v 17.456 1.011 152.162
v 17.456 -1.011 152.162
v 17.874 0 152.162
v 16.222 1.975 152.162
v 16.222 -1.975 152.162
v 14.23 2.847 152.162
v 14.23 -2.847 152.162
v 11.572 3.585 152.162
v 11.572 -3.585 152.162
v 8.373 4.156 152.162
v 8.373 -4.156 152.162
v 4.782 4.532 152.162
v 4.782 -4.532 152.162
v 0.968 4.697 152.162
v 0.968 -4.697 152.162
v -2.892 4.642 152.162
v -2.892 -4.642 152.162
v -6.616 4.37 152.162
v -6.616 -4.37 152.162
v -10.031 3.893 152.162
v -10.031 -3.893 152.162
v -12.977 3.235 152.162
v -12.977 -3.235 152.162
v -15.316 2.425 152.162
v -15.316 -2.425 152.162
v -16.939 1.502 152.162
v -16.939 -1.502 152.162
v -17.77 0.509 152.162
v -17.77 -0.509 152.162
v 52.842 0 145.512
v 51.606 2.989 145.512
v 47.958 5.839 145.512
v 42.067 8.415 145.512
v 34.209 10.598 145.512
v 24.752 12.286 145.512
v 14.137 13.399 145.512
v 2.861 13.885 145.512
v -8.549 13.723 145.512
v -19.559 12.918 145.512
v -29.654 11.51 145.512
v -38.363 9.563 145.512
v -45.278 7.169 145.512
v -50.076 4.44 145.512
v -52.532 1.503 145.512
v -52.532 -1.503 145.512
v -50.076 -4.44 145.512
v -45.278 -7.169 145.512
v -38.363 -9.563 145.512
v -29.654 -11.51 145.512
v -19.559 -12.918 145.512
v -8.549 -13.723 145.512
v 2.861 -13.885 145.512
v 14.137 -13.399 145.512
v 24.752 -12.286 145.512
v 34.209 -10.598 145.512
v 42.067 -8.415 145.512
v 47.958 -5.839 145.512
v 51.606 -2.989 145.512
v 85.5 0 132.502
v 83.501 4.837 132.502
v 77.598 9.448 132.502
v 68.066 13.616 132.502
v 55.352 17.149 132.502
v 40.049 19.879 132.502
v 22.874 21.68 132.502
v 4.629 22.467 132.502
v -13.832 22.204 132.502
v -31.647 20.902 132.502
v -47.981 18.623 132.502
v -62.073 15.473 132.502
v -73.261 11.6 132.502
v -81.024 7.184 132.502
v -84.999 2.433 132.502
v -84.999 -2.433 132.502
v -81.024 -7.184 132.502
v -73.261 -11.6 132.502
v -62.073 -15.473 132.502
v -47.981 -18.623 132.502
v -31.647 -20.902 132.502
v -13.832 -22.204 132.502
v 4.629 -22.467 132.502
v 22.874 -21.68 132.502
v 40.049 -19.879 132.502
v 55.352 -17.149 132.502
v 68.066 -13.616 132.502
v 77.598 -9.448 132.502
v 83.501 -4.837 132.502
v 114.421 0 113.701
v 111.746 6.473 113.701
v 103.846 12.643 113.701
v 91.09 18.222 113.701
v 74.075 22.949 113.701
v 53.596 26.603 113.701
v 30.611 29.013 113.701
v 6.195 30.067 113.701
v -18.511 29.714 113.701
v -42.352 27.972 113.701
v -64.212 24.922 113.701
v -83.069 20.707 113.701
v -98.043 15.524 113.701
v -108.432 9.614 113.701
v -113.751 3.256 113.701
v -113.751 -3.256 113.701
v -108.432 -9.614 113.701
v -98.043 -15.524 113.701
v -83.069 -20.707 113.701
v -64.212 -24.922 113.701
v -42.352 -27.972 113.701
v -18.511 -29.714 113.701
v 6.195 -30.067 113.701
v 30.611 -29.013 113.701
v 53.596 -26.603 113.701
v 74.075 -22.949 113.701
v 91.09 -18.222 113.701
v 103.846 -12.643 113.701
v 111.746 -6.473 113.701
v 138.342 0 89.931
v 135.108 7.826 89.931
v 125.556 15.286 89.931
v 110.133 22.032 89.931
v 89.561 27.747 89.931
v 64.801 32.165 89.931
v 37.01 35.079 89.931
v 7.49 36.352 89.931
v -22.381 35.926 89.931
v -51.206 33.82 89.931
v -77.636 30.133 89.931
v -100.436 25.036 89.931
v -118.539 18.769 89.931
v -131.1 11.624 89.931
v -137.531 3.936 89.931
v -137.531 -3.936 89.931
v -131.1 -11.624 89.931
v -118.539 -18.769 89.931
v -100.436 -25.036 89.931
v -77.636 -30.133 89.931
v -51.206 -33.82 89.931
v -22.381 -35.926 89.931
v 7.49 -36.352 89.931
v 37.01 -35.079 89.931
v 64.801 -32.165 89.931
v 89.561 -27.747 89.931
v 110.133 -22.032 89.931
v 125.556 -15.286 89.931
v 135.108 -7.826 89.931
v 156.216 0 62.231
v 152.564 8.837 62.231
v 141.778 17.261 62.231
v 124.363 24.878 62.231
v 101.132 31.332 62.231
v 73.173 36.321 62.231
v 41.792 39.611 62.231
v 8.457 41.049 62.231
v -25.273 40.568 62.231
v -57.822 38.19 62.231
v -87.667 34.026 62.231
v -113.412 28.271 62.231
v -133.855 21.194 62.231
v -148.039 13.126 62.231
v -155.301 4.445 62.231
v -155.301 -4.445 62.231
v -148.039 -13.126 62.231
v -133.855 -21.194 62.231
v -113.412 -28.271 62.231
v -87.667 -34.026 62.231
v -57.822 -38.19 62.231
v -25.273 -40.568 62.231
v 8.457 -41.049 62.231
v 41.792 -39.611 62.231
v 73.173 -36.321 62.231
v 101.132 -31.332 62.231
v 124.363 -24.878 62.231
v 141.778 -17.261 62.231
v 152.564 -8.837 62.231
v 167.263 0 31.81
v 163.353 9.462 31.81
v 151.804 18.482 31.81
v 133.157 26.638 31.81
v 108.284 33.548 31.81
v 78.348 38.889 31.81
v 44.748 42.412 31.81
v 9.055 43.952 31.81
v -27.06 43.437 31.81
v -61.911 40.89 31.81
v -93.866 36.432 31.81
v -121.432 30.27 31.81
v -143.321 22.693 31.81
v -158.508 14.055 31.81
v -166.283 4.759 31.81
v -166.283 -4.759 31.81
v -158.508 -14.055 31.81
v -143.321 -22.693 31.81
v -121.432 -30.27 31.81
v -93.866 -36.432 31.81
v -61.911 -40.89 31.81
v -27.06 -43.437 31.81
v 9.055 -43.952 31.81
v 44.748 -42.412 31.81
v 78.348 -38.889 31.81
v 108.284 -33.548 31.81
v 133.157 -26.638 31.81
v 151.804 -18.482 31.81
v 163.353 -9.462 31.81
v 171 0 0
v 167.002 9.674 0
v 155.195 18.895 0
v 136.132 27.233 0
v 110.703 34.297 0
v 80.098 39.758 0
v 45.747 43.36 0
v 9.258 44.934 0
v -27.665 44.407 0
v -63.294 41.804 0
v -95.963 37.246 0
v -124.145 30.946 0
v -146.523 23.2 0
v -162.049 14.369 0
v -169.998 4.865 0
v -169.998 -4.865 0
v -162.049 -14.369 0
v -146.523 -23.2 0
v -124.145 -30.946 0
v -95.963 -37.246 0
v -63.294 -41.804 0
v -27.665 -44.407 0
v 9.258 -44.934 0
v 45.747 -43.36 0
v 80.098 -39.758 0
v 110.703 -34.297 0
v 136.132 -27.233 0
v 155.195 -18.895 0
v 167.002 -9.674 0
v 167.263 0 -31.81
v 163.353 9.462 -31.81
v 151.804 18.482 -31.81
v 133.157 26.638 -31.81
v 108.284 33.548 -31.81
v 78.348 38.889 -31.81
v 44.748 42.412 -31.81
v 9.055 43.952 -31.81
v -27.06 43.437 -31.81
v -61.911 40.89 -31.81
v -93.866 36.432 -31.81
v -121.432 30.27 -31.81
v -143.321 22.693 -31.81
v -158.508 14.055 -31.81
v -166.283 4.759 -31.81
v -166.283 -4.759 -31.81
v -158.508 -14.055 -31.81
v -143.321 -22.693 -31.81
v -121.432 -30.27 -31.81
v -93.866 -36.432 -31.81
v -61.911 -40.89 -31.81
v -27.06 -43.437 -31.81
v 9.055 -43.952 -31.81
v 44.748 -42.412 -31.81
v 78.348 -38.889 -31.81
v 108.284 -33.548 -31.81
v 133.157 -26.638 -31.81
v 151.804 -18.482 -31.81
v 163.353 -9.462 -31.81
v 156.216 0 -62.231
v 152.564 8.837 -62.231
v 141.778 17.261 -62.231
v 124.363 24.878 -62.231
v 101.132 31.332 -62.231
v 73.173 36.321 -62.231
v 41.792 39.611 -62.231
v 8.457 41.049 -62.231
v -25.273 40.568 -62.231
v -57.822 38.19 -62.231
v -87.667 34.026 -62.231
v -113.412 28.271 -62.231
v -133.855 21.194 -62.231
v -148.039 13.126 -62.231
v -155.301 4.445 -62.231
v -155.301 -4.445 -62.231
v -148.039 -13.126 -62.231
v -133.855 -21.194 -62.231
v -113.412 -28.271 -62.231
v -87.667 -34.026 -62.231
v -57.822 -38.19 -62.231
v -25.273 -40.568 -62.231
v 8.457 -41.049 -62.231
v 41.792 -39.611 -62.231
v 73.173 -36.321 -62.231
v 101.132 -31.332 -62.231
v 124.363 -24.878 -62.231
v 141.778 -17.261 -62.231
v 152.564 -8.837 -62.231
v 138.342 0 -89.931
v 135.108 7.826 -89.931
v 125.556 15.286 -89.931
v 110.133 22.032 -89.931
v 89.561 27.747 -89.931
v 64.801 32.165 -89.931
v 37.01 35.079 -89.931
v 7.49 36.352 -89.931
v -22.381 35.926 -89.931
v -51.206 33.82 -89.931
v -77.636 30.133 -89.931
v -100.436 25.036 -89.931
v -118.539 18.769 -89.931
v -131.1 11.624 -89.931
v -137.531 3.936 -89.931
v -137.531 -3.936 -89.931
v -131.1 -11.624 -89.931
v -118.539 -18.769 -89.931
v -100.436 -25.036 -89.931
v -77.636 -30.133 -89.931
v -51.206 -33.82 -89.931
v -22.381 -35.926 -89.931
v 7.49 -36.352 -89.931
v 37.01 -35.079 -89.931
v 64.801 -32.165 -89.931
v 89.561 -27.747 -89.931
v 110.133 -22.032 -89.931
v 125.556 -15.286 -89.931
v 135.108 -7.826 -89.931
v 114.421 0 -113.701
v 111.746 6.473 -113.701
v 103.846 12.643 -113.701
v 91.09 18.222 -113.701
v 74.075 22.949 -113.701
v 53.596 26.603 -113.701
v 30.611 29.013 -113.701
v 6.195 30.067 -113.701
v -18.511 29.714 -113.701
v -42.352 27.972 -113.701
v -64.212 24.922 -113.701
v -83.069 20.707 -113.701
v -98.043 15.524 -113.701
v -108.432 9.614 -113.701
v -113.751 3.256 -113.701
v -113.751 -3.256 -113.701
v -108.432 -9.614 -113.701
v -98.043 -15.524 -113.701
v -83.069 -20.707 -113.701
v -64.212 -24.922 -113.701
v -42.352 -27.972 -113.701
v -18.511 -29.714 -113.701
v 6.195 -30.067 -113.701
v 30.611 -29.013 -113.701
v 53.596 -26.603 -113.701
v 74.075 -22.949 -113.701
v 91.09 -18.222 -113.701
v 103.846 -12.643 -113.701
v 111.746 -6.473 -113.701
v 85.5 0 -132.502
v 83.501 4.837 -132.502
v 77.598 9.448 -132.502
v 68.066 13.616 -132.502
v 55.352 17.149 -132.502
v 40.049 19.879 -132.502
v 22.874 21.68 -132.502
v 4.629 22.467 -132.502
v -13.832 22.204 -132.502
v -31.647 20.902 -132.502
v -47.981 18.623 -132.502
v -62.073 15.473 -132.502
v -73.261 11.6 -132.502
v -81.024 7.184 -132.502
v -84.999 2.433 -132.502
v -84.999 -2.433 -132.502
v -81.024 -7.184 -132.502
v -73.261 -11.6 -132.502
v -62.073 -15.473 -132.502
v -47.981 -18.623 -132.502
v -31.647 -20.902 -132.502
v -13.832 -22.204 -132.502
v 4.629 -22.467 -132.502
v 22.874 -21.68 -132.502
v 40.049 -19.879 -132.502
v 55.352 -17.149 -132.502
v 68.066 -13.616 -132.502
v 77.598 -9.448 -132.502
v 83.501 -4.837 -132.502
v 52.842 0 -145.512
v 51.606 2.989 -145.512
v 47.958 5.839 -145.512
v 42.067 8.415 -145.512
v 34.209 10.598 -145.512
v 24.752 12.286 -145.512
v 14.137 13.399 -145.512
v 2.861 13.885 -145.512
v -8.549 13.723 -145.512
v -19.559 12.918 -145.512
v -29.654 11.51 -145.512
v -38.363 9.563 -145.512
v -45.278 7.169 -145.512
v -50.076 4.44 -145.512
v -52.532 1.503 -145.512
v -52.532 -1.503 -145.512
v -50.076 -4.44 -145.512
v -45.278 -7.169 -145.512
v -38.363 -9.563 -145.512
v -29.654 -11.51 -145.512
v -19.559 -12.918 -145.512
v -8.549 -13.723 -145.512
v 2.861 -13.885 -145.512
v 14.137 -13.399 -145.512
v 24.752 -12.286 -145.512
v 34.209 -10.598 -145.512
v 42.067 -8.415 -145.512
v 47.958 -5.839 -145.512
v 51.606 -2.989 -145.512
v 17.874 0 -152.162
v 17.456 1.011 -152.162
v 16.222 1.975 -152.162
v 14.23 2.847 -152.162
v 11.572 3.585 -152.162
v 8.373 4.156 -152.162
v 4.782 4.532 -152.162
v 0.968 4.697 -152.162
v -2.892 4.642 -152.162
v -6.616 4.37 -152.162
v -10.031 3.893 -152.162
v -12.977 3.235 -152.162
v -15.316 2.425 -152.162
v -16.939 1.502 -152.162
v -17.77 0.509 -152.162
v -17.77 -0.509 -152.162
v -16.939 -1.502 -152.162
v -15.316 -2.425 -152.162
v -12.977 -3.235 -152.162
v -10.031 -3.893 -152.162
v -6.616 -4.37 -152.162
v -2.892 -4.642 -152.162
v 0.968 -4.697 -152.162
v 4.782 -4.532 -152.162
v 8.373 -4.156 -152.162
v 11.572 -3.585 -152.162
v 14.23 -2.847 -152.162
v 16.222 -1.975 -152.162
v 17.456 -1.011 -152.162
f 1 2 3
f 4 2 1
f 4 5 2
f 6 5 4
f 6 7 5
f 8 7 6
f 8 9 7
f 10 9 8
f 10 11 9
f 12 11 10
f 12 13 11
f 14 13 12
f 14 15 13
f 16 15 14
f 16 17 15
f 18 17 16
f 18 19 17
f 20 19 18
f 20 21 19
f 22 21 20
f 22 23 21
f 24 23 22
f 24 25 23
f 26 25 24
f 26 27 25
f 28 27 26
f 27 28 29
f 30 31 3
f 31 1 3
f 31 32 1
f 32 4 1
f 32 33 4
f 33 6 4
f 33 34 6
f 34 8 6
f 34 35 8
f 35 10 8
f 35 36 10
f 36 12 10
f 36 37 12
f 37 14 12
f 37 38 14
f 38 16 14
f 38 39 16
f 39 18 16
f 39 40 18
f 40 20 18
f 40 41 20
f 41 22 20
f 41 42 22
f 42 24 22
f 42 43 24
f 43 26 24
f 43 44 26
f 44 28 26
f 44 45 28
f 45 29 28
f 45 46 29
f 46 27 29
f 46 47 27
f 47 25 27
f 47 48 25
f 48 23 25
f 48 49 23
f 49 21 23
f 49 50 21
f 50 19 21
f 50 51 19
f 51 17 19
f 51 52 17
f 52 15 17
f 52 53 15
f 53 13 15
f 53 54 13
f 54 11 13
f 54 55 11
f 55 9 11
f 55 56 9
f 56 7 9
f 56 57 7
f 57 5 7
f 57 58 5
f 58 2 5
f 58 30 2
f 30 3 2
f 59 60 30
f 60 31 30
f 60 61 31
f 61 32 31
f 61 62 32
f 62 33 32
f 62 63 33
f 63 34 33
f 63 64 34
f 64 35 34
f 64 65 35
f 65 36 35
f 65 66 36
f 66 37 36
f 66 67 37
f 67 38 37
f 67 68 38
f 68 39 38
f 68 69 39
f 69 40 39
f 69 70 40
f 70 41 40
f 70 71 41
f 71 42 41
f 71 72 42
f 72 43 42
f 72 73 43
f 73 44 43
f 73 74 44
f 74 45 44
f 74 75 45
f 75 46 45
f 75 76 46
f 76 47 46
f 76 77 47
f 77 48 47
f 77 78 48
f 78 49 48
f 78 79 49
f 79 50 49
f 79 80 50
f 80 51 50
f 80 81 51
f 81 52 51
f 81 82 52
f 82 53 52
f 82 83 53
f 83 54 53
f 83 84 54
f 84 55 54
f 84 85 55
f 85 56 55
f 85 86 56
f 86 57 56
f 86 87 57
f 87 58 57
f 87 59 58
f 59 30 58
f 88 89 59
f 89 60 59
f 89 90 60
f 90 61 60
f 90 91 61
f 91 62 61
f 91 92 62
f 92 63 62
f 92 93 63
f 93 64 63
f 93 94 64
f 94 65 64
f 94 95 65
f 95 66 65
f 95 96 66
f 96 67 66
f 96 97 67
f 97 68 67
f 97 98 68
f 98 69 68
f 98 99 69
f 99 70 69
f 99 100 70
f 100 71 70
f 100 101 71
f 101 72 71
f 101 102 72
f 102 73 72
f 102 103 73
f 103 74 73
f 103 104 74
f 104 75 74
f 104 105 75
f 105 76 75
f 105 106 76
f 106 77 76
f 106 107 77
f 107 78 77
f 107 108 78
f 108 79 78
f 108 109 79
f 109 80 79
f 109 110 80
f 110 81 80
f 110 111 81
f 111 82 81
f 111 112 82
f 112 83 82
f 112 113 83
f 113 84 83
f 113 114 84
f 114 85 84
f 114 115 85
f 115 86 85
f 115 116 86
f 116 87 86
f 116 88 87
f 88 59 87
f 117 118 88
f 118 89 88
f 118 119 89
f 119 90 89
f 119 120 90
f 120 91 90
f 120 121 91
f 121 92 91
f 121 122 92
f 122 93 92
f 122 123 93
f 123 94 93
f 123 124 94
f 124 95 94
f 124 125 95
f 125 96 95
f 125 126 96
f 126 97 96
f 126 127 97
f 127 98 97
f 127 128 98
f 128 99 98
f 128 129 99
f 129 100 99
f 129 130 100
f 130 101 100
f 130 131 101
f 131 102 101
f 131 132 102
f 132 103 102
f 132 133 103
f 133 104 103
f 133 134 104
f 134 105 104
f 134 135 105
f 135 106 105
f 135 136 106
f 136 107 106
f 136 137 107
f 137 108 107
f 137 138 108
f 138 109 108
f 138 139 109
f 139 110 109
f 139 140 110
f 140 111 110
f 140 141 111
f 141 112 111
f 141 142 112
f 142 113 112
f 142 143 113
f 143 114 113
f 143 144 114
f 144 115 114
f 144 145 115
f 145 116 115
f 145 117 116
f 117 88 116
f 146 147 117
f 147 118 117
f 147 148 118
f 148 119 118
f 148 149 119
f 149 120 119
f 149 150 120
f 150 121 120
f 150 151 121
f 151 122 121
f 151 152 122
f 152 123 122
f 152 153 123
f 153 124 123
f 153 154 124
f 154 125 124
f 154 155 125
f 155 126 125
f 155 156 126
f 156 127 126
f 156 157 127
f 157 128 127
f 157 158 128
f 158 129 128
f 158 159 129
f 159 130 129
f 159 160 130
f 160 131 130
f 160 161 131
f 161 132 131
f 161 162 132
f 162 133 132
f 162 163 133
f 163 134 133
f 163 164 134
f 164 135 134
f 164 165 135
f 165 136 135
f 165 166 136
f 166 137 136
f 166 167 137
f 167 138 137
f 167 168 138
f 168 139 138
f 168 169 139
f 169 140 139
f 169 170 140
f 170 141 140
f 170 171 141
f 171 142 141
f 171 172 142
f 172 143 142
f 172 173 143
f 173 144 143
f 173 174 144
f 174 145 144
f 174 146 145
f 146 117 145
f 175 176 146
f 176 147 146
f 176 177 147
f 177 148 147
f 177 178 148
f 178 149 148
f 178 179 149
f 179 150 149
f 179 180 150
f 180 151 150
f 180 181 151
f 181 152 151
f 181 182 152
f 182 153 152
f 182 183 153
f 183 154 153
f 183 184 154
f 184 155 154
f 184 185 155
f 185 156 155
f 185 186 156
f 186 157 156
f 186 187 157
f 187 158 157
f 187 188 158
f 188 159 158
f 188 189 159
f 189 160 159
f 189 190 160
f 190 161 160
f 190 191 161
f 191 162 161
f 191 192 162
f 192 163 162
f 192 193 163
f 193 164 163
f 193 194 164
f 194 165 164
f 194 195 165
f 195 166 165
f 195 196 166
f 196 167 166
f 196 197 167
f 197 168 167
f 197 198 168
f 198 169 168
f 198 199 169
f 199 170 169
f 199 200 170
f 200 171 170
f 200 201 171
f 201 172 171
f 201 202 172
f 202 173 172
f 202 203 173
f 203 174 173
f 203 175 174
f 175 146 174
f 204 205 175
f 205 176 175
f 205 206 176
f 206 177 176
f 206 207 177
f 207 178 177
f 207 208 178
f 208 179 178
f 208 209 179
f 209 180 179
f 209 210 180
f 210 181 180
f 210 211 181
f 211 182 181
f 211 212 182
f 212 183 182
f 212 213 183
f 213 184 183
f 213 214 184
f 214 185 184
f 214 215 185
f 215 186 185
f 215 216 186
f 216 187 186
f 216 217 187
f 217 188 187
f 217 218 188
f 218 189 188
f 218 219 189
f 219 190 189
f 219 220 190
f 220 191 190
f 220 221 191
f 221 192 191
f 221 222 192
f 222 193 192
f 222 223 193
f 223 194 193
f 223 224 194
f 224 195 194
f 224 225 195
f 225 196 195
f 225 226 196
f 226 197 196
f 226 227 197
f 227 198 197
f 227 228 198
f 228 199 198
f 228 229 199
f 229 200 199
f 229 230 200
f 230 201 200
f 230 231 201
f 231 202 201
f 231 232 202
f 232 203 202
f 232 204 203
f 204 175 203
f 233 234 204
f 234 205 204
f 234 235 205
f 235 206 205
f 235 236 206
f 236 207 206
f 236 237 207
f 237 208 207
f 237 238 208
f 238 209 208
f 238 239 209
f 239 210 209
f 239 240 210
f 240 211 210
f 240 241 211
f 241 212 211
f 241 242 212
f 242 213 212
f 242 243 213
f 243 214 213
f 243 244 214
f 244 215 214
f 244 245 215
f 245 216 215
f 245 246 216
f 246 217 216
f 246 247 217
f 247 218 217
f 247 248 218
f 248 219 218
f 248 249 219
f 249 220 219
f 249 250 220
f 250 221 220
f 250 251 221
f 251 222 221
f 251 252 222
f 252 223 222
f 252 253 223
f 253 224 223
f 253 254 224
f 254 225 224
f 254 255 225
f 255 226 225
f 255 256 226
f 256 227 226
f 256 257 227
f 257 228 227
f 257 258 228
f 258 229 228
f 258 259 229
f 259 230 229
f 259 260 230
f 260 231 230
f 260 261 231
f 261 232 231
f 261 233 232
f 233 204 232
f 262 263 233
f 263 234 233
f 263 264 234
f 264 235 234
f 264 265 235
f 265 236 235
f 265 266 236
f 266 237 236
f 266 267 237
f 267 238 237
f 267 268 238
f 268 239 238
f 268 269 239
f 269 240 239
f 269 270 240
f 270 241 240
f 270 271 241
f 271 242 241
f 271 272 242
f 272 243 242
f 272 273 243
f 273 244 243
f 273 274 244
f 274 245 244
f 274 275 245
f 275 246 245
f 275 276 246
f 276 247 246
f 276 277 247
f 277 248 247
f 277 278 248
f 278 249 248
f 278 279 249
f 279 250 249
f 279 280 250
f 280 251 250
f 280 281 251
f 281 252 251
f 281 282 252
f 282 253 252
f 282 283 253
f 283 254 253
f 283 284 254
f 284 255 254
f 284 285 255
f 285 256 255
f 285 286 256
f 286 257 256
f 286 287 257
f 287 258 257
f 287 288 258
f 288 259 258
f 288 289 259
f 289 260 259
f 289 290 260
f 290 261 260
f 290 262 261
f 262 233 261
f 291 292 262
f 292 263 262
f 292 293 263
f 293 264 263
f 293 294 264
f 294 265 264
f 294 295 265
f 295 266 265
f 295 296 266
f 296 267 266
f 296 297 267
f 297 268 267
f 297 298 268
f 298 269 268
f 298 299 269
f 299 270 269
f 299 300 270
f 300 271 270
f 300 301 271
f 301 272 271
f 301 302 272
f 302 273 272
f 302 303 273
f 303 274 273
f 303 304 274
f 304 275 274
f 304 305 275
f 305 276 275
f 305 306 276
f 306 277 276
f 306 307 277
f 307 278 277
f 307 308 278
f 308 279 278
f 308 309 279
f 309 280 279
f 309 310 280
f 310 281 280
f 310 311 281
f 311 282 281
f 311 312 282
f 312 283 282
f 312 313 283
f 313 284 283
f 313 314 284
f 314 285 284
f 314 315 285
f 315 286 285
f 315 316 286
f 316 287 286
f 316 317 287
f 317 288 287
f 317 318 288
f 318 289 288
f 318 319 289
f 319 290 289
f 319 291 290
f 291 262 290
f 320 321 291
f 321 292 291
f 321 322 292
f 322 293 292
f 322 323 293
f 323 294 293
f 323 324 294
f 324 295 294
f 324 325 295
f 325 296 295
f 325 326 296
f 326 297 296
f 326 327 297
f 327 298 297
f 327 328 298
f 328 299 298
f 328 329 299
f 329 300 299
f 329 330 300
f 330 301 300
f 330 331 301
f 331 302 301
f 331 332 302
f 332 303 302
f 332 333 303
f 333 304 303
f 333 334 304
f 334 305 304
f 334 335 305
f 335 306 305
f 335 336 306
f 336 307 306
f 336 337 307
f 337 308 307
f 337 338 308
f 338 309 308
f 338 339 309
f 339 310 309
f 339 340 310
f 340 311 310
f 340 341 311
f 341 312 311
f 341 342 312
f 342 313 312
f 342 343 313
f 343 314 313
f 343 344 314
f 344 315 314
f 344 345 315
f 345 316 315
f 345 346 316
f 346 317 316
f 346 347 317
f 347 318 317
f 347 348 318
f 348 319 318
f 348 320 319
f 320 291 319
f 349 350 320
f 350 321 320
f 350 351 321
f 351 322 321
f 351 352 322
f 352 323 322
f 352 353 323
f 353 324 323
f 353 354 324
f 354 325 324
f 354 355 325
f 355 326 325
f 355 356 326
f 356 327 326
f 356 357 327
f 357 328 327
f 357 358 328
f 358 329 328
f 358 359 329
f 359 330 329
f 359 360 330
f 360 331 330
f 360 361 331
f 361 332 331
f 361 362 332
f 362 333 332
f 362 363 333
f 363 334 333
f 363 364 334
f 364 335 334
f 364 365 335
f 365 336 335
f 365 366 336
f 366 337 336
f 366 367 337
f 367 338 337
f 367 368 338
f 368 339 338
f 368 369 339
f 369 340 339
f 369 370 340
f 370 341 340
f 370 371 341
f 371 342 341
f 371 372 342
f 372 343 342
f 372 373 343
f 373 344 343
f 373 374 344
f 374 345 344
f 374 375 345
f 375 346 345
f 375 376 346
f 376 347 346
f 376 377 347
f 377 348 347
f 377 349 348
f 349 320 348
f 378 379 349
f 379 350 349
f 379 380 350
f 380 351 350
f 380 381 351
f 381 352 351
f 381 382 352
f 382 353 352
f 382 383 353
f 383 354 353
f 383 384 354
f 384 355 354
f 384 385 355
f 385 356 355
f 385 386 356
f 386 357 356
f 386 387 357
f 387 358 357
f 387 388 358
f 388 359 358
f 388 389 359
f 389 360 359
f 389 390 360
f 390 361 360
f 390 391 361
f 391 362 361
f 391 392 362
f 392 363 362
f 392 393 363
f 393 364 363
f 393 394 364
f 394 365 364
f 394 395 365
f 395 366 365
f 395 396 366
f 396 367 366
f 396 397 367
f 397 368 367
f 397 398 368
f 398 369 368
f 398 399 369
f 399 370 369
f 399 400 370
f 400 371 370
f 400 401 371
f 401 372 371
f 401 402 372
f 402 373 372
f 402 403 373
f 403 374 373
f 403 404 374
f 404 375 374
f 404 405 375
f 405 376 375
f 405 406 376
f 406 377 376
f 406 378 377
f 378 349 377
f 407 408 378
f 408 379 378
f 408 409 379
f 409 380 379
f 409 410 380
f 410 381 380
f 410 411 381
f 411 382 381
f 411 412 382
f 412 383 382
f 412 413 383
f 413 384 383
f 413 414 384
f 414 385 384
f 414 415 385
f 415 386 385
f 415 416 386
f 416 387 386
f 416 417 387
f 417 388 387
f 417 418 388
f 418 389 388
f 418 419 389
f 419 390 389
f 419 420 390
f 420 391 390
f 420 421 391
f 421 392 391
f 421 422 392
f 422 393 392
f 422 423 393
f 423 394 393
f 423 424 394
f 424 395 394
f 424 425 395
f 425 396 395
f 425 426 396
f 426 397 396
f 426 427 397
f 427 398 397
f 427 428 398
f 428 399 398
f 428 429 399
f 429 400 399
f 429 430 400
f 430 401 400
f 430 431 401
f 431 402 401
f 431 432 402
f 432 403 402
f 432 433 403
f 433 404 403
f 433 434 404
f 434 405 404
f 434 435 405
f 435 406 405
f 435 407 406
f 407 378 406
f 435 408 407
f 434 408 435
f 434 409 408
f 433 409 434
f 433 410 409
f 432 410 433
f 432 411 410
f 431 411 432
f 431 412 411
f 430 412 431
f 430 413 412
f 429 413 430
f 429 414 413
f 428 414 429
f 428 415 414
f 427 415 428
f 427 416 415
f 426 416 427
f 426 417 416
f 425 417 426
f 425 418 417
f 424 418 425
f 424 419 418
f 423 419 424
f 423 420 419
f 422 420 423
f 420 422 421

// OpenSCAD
// Generated by SolidPython 1.0.1 on 2020-07-29 00:46:53


scale(v = [19, 5, 17]) {
	sphere(r = 9);
}
/***********************************************
*********      SolidPython code:      **********
************************************************
 
# import packages: SolidPython
from solid import *
from solid.utils import *
from itertools import chain, combinations, permutations


class Resize:

    def __init__(self, scad_file):
        self.scad_file = scad_file
        #self.scad_file = import_scad(scad_file)
        # cone/cylinder param:
        self.r1 = 0
        self.r2 = 0
        self.h = 0
        # rectangular prism param:
        self.w = 0
        self.l = 0
        # ellipse param:
        self.r = 0

    # import OpenScad code (file name corresponds to shape)


    # classify shape + parameters
    def assign(self, param1, param2, param3):
        if self.scad_file == 'cone.scad':
            self.r1 = param1
            self.r2 = param2
            self.h = param3
        elif self.scad_file == 'cylinder.scad':
            self.r1 = param1
            self.r2 = param2
            self.h = param3
        elif self.scad_file == 'rectangularPrism.scad':
            self.h = param1
            self.l = param2
            self.w = param3
        else:
            self.r = param1
            self.h = param2

    # resize parameters
    def iterate(self):
        x = range(3, 20, 2)
        i = 1
        if self.scad_file == 'cone.scad':
            tempList = list(permutations(x, 2))
            for temp in tempList:
                param1 = temp[0]
                param2 = temp[1]
                filepath = 'produced_scad_files/' + 'cone' + str(param1) + '_' + str(param2) + '_' + '.scad'
                scad_render_to_file(cylinder(h=param1, r1=param2, r2=0), filepath)

        elif self.scad_file == 'cylinder.scad':
            tempList = list(permutations(x, 3))
            for temp in tempList:
                param1 = temp[0]
                param2 = temp[1]
                filepath = 'produced_scad_files/' + 'cylinder' + str(param1) + '_' + str(param2) + '_' + '.scad'
                scad_render_to_file(cylinder(h=param1, r1=param2, r2=param2), filepath)

        elif self.scad_file == 'rectangularPrism.scad':
            tempList = list(permutations(x, 3))
            for temp in tempList:
                param1 = temp[0]
                param2 = temp[1]
                param3 = temp[2]
                filepath = 'produced_scad_files/' + 'rectangularPrism' + str(param1) + '_' + str(param2) + '_' + str(
                    param3) + '.scad'
                scad_render_to_file(cube(size=(param1, param2, param3)), filepath)

        elif self.scad_file == 'ellipse.scad':
            tempList = list(permutations(x, 4))
            for temp in tempList:
                param1 = temp[0]
                param2 = temp[1]
                param3 = temp[2]
                param4 = temp[3]
                filepath = 'produced_scad_files/' + 'ellipse' + str(param1) + '_' + str(param2) + '_' + str(param3) + '_' + str(param4) + '.scad'
                scad_render_to_file(scale([param1, param2, param3])(sphere(r=param4)), filepath)

    def render_to_scadfile(self):
        scad_render_to_file(scad, 'example.scad') 
 
************************************************/
